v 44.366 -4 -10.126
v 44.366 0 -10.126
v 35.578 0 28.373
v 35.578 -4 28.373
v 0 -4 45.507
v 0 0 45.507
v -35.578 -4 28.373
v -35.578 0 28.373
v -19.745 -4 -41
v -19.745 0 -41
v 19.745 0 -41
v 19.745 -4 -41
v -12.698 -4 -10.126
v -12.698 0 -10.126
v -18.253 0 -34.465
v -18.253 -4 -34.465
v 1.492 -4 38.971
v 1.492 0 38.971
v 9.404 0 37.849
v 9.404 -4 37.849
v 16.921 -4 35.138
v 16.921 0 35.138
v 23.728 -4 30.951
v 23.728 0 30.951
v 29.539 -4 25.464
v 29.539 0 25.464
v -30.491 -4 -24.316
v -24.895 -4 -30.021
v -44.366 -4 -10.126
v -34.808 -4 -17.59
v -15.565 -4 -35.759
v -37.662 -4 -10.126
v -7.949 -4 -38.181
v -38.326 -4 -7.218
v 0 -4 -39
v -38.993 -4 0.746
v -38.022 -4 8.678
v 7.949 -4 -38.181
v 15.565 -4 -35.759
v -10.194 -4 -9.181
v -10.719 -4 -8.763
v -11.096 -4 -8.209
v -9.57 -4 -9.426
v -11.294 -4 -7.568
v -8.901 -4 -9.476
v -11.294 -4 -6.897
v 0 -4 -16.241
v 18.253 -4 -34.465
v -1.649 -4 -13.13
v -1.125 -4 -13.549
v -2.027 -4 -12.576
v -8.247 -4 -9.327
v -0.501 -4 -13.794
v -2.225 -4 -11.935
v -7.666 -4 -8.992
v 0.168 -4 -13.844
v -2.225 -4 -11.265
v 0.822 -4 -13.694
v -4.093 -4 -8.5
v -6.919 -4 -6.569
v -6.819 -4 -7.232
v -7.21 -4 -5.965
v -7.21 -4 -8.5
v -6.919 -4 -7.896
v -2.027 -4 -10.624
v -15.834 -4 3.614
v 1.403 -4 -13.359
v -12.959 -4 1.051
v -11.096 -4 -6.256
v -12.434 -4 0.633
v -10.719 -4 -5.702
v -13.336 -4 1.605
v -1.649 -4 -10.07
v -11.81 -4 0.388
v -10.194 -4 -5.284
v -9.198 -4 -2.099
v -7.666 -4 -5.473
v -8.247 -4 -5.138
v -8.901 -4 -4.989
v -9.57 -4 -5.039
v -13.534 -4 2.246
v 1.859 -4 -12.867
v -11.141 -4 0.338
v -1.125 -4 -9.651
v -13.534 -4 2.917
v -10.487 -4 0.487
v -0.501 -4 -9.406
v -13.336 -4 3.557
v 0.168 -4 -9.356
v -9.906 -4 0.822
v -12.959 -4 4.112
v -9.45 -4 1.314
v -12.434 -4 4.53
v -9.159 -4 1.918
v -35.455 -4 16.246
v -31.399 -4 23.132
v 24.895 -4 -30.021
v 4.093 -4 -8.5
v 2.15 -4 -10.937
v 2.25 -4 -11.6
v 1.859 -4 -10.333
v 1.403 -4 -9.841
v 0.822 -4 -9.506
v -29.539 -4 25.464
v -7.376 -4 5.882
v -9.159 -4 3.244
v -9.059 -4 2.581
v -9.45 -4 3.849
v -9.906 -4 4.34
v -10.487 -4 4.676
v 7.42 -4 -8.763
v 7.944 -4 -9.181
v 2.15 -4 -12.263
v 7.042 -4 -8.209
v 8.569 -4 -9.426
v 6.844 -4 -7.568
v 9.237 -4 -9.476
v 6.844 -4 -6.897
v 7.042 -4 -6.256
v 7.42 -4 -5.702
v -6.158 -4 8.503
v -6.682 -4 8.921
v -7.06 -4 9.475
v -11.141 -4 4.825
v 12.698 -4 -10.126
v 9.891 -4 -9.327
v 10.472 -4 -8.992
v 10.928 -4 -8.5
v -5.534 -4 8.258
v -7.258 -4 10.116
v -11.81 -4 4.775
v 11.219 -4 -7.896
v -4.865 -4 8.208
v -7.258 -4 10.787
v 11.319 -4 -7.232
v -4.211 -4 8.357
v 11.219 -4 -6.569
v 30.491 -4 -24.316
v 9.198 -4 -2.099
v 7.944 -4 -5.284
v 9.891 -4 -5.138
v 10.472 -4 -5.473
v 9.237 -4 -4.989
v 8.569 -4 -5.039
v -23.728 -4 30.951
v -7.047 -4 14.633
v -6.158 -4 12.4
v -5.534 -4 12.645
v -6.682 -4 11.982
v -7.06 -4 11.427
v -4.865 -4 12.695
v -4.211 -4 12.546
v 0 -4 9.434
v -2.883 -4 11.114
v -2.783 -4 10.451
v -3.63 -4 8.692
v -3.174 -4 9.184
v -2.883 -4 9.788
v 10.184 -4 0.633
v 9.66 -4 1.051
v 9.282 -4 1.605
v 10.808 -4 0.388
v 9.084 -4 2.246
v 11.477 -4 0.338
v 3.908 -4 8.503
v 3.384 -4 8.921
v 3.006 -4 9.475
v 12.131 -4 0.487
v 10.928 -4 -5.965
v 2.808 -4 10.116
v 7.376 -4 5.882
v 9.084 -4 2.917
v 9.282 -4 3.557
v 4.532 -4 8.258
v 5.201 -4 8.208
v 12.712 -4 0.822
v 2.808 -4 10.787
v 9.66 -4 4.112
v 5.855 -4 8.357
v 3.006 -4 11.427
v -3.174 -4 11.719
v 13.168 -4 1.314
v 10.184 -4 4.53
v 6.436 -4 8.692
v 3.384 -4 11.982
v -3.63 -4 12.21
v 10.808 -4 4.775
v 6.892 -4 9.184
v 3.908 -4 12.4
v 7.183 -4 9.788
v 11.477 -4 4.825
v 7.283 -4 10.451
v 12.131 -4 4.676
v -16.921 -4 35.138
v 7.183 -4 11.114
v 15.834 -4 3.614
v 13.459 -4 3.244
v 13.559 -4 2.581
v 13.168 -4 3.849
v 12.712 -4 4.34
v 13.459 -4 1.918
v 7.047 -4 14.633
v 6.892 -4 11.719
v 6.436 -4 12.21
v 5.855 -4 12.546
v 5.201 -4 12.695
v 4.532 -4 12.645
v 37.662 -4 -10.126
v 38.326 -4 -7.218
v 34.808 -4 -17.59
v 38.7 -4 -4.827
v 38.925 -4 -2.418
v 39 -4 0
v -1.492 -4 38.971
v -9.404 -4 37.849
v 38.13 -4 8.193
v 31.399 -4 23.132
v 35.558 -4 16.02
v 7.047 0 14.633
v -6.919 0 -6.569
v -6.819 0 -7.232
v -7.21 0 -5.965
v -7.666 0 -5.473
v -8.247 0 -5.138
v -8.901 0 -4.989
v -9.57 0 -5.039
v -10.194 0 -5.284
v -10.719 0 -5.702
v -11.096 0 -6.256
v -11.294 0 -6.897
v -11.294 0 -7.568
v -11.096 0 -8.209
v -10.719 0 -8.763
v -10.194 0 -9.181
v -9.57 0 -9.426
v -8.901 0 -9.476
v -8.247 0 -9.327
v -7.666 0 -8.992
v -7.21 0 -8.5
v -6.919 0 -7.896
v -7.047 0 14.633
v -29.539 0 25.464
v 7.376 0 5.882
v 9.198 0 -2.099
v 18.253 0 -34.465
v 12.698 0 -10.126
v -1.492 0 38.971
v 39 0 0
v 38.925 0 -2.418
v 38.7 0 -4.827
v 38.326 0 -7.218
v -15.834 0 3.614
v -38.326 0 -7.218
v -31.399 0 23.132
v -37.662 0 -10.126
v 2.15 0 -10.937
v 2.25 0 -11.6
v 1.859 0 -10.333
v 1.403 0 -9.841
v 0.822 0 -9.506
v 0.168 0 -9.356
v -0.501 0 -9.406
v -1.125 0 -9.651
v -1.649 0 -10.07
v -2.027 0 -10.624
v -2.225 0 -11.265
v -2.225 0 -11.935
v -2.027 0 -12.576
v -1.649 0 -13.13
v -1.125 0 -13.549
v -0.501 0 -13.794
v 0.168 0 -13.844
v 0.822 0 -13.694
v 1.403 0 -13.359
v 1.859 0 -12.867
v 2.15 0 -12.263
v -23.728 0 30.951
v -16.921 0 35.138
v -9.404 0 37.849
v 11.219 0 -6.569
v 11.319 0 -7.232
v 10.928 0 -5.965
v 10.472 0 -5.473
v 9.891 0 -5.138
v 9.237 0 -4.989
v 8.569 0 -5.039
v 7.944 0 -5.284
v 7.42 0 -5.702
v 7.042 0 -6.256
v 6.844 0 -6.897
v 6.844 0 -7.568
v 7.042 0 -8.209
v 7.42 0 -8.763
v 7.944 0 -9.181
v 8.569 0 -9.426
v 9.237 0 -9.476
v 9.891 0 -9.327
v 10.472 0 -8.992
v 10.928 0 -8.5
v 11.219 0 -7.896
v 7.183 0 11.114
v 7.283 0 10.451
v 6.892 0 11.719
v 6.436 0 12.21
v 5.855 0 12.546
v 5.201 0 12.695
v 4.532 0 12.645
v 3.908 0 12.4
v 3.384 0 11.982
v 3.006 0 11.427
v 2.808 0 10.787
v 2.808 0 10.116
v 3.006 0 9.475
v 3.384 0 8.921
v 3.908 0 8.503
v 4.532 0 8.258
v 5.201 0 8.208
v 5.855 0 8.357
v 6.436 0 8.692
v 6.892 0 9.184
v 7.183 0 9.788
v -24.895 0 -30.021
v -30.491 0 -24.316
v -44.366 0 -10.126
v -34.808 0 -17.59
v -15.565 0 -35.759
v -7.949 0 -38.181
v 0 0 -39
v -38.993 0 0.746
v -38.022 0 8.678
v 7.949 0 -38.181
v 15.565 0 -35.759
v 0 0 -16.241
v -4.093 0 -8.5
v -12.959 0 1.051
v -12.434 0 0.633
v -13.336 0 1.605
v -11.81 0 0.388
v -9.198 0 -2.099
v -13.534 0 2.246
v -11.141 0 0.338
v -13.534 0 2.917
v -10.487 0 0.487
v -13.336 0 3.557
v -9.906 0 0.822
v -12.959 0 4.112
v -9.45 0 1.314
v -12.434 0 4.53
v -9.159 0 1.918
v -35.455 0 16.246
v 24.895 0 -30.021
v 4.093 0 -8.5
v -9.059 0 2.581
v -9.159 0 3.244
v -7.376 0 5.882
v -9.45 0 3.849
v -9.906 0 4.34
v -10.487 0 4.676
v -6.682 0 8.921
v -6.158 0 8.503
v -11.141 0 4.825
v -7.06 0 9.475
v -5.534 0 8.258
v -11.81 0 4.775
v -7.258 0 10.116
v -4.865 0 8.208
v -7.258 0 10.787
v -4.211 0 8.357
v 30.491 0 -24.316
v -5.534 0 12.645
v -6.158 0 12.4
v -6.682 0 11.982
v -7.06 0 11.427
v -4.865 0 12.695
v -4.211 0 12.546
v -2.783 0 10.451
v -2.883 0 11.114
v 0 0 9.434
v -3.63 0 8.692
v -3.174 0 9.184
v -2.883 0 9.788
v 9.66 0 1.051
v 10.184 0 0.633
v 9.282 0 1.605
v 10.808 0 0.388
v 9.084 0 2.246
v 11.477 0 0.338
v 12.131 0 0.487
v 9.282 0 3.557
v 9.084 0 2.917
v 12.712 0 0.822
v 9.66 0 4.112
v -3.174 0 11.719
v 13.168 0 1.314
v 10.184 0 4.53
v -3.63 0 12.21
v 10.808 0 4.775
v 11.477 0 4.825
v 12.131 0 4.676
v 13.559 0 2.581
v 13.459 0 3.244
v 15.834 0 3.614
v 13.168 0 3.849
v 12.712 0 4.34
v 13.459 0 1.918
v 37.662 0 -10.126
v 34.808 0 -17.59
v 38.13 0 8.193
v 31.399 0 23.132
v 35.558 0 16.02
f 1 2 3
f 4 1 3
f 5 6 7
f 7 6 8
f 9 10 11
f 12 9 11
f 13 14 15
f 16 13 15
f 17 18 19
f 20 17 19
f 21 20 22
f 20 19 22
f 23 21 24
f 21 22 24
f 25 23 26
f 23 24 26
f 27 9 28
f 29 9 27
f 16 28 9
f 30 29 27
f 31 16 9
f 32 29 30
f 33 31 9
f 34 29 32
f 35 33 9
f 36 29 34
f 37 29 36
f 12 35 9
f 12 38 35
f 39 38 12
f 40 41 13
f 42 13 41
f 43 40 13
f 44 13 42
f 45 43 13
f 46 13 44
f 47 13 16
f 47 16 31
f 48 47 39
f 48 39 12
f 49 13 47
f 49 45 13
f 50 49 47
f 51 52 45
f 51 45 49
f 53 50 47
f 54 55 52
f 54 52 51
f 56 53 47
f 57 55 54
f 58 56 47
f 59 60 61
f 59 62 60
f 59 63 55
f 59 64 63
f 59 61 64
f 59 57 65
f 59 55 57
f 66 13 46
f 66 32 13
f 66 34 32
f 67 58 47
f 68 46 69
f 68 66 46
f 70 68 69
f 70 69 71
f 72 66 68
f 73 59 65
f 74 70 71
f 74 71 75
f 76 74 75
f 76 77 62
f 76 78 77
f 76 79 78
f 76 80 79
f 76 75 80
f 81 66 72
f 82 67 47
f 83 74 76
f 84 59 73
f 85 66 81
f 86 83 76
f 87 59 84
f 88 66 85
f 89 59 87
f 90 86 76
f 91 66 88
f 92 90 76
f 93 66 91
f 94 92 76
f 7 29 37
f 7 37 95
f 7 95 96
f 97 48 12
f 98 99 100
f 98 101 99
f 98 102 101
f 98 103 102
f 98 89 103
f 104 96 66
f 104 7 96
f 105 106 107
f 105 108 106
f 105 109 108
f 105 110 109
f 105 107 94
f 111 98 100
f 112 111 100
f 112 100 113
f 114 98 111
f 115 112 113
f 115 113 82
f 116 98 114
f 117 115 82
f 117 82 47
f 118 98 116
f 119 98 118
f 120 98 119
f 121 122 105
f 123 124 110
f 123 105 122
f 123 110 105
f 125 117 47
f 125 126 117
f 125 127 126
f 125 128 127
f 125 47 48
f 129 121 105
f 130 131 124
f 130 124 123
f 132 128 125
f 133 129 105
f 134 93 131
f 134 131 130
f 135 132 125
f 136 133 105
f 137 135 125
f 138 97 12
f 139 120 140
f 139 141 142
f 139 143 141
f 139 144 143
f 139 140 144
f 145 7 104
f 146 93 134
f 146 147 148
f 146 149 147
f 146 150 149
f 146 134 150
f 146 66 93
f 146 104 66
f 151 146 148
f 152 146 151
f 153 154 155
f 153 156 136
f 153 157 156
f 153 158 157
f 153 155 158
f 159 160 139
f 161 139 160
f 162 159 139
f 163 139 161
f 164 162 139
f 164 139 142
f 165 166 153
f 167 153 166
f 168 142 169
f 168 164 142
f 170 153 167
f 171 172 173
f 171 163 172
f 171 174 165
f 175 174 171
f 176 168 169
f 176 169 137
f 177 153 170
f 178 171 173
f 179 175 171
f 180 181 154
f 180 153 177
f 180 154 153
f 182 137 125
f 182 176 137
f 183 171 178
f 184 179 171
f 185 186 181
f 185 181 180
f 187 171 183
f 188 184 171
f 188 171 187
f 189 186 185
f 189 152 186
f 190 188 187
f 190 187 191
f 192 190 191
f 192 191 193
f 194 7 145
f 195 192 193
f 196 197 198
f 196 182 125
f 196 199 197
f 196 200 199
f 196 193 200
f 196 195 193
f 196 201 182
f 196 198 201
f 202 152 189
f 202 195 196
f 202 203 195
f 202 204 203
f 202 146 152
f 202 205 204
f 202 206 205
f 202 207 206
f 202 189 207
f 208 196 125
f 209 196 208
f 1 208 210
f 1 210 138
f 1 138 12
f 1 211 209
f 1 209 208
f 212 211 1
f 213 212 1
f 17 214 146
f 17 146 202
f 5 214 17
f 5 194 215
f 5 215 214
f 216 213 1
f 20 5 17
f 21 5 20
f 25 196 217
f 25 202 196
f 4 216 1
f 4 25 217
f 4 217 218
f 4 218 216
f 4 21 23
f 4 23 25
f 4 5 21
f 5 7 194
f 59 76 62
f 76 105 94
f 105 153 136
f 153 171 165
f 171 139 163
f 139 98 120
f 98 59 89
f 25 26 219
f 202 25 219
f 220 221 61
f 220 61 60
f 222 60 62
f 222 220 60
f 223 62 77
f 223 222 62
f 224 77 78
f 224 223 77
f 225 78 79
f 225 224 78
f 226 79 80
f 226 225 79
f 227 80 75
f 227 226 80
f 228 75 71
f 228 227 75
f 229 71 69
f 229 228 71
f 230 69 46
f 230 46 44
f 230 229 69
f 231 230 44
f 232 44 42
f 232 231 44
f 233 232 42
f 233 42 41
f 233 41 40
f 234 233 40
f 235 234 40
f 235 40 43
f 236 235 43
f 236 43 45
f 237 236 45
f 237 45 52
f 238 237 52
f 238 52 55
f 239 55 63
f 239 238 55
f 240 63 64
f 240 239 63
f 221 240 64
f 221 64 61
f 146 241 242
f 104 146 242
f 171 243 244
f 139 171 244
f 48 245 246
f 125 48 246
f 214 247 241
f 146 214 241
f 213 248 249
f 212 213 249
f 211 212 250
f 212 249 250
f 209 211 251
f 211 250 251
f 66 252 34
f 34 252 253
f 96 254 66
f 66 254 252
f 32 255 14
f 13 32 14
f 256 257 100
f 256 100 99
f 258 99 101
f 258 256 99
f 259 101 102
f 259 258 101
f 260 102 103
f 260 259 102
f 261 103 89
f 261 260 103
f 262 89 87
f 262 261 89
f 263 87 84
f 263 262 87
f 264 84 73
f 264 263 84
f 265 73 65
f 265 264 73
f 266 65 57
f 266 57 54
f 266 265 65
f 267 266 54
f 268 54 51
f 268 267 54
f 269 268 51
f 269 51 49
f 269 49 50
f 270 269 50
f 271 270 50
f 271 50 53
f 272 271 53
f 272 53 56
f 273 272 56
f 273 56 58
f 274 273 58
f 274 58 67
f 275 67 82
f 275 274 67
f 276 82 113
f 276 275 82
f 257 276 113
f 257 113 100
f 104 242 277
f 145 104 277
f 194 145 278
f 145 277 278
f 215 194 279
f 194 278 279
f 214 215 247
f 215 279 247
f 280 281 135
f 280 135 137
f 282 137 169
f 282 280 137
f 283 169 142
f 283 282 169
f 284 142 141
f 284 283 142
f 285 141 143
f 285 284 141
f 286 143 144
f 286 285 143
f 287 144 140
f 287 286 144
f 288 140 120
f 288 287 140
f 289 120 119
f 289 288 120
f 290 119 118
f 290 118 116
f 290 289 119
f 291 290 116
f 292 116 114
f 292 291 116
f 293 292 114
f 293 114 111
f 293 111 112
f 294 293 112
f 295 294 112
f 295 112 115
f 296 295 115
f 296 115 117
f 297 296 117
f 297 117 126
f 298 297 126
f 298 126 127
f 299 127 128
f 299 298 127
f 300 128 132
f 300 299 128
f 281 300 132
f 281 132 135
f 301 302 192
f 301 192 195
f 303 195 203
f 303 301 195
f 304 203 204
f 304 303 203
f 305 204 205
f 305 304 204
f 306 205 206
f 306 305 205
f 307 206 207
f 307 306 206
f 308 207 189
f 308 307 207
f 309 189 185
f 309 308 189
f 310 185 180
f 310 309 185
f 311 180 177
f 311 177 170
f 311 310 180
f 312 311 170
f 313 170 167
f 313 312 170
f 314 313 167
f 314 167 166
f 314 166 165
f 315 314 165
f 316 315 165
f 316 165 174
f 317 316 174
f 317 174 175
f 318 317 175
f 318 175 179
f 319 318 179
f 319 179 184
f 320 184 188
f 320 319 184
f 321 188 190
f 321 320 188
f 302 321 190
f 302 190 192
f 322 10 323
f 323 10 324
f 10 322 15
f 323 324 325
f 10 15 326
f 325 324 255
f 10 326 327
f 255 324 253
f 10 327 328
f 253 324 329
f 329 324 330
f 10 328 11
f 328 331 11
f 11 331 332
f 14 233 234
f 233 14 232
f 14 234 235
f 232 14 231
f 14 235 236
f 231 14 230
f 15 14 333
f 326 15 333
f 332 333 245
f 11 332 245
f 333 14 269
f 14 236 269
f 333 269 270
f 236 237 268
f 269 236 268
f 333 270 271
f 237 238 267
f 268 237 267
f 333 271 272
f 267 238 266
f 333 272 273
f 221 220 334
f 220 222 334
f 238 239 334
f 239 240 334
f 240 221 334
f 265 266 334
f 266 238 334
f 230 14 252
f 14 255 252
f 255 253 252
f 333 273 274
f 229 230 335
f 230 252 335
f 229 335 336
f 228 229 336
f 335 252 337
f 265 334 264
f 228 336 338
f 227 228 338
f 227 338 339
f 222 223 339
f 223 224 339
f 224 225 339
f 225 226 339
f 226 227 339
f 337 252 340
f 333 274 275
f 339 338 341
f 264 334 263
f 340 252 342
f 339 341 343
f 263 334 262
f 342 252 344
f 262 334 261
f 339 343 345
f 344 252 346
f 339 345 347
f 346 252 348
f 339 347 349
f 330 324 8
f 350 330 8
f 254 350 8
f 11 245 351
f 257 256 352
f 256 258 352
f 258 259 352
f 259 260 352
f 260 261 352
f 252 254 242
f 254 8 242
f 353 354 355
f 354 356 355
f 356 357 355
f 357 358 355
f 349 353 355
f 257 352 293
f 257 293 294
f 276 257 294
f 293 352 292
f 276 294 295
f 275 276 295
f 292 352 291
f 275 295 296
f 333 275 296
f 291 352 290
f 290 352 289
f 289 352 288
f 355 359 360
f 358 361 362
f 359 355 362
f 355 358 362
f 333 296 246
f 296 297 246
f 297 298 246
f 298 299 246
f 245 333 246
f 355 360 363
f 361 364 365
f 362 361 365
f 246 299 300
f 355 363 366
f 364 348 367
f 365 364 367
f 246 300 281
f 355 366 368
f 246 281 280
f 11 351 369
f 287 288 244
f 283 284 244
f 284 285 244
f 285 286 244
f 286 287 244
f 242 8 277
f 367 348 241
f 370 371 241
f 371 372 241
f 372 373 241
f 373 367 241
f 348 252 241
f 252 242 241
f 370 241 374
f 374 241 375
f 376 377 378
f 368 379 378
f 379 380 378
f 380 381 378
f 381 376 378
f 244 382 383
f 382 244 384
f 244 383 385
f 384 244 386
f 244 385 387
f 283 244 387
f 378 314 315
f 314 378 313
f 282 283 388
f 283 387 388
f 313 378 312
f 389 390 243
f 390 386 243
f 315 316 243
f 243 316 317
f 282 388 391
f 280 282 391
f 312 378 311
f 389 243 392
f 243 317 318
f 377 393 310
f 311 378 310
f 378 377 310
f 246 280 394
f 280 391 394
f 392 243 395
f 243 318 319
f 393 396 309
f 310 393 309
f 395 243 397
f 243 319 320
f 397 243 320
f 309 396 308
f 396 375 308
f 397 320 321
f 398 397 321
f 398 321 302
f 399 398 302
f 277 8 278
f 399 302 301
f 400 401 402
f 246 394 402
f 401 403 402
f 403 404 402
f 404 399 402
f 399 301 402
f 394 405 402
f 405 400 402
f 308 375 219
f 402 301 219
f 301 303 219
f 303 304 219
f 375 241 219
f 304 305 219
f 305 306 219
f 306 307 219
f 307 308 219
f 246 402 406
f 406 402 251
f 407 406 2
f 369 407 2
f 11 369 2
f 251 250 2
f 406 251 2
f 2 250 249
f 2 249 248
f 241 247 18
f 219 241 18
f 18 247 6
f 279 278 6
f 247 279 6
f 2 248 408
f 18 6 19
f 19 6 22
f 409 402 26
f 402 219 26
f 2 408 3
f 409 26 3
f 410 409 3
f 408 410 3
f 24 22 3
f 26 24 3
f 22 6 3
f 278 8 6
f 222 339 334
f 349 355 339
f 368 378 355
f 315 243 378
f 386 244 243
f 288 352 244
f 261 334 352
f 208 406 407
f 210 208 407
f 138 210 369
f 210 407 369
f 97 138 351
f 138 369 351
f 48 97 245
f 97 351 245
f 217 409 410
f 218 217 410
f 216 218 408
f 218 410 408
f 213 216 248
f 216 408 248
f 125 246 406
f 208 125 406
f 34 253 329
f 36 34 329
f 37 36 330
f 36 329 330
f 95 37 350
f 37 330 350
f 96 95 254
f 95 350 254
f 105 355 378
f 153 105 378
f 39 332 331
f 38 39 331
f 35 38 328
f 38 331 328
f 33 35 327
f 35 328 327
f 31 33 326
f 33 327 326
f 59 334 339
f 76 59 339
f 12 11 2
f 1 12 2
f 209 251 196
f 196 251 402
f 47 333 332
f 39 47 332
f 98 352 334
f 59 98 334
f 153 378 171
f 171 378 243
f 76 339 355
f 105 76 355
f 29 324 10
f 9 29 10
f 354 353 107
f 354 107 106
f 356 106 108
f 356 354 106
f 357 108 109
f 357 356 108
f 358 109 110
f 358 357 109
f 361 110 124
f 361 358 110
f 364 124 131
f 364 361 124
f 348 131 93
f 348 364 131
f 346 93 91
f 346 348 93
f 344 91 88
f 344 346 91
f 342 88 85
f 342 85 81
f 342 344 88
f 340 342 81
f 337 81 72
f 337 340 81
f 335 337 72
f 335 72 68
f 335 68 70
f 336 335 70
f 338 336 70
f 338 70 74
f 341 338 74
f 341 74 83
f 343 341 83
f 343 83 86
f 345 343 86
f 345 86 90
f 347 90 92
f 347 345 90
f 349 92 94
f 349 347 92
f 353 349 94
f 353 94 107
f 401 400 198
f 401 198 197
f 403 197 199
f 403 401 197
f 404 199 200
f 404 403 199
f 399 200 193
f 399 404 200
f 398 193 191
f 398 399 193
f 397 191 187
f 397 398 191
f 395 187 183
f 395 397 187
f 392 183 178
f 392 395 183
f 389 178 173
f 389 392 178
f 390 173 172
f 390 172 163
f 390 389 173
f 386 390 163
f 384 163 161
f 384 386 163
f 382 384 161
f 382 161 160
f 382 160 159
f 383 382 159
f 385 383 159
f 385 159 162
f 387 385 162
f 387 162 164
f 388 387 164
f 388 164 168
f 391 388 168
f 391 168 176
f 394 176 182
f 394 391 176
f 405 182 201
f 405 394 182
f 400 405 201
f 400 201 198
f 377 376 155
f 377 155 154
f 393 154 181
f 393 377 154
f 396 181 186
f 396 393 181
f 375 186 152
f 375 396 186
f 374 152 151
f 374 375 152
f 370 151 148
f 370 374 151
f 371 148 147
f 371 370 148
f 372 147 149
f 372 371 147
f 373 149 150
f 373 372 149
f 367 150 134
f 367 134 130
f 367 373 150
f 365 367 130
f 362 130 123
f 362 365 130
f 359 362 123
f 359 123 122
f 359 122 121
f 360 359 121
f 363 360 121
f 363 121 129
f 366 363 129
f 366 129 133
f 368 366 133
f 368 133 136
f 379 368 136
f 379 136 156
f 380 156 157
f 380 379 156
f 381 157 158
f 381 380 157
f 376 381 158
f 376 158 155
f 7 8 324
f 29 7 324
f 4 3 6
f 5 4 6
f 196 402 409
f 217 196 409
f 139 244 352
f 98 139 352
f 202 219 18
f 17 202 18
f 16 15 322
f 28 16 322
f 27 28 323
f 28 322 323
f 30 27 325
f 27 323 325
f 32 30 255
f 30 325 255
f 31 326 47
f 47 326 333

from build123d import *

# Parameters (mm, degrees)
F0_R     = 2.25
F1_DEPTH = 4


# Not quite as in the source:
# - a feature names something its author has since deleted; it is built from what else it names


with BuildPart() as f1:
    # F0 (on Front) → F1 (new body)
    with BuildSketch(Plane.XZ):
        with BuildLine():
            Line((-7.0467516529, 14.6327305836), (-29.539125133, 25.4644867683))
            ThreePointArc((-29.539125133, 25.4644867683), (-30.4914278163, 24.3161022725), (-31.3991126327, 23.1321362152))
            Line((-31.3991126327, 23.1321362152), (-15.8339072365, 3.6139860008))
            Line((-15.8339072365, 3.6139860008), (-8.7871555836, 7.0075227419))
            Line((-8.7871555836, 7.0075227419), (-7.0467516529, 14.6327305836))
        make_face()
        with BuildLine():
            Line((-1.4915941641, 38.9714658032), (-7.0467516529, 14.6327305836))
            Line((-7.0467516529, 14.6327305836), (0, 11.2391938425))
            Line((0, 11.2391938425), (7.0467516529, 14.6327305836))
            Line((7.0467516529, 14.6327305836), (1.4915941641, 38.9714658032))
            ThreePointArc((1.4915941641, 38.9714658032), (0, 39), (-1.4915941641, 38.9714658032))
        make_face()
        Polygon((0, 11.2391938425), (-7.0467516529, 14.6327305836), (-8.7871555836, 7.0075227419), (-15.8339072365, 3.6139860008), (-10.9574037875, -2.5009559107), (-12.6978077182, -10.1261637524), (-4.8765034491, -10.1261637524), (0, -16.241105664), (4.8765034491, -10.1261637524), (12.6978077182, -10.1261637524), (10.9574037875, -2.5009559107), (15.8339072365, 3.6139860008), (8.7871555836, 7.0075227419), (7.0467516529, 14.6327305836), align=None)
        with Locations((-9.0692451966, -7.2324817016)):
            Circle(F0_R, mode=Mode.SUBTRACT)
        with Locations((0, -11.6)):
            Circle(F0_R, mode=Mode.SUBTRACT)
        with Locations((9.0692451966, -7.2324817016)):
            Circle(F0_R, mode=Mode.SUBTRACT)
        with Locations((-11.3091637813, 2.5812428339)):
            Circle(F0_R, mode=Mode.SUBTRACT)
        with Locations((-5.0330513738, 10.4512388677)):
            Circle(F0_R, mode=Mode.SUBTRACT)
        Polygon((-9.1977509421, -2.0993266316), (-7.376023565, 5.8821825089), (0, 9.4342882455), (7.376023565, 5.8821825089), (9.1977509421, -2.0993266316), (4.0933842599, -8.5), (-4.0933842599, -8.5), align=None, mode=Mode.SUBTRACT)
        with Locations((11.3091637813, 2.5812428339)):
            Circle(F0_R, mode=Mode.SUBTRACT)
        with Locations((5.0330513738, 10.4512388677)):
            Circle(F0_R, mode=Mode.SUBTRACT)
        with BuildLine():
            Line((29.539125133, 25.4644867683), (7.0467516529, 14.6327305836))
            Line((7.0467516529, 14.6327305836), (8.7871555836, 7.0075227419))
            Line((8.7871555836, 7.0075227419), (15.8339072365, 3.6139860008))
            Line((15.8339072365, 3.6139860008), (31.3991126327, 23.1321362152))
            ThreePointArc((31.3991126327, 23.1321362152), (30.4914278163, 24.3161022725), (29.539125133, 25.4644867683))
        make_face()
        with BuildLine():
            Line((38.3262807167, -7.2177701839), (15.8339072365, 3.6139860008))
            Line((15.8339072365, 3.6139860008), (10.9574037875, -2.5009559107))
            Line((10.9574037875, -2.5009559107), (12.6978077182, -10.1261637524))
            Line((12.6978077182, -10.1261637524), (37.6624588637, -10.1261637524))
            ThreePointArc((37.6624588637, -10.1261637524), (38.0221885751, -8.6783164243), (38.3262807167, -7.2177701839))
        make_face()
        with BuildLine():
            Line((4.8765034491, -10.1261637524), (0, -16.241105664))
            Line((0, -16.241105664), (15.5652053962, -35.7592558784))
            ThreePointArc((15.5652053962, -35.7592558784), (16.9214658256, -35.1377858482), (18.252965207, -34.464898972))
            Line((18.252965207, -34.464898972), (12.6978077182, -10.1261637524))
            Line((12.6978077182, -10.1261637524), (4.8765034491, -10.1261637524))
        make_face()
        with BuildLine():
            Line((-4.8765034491, -10.1261637524), (-12.6978077182, -10.1261637524))
            Line((-12.6978077182, -10.1261637524), (-18.252965207, -34.464898972))
            ThreePointArc((-18.252965207, -34.464898972), (-16.9214658256, -35.1377858482), (-15.5652053962, -35.7592558784))
            Line((-15.5652053962, -35.7592558784), (0, -16.241105664))
            Line((0, -16.241105664), (-4.8765034491, -10.1261637524))
        make_face()
        with BuildLine():
            Line((-10.9574037875, -2.5009559107), (-15.8339072365, 3.6139860008))
            Line((-15.8339072365, 3.6139860008), (-38.3262807167, -7.2177701839))
            ThreePointArc((-38.3262807167, -7.2177701839), (-38.0221885751, -8.6783164243), (-37.6624588637, -10.1261637524))
            Line((-37.6624588637, -10.1261637524), (-12.6978077182, -10.1261637524))
            Line((-12.6978077182, -10.1261637524), (-10.9574037875, -2.5009559107))
        make_face()
        with BuildLine():
            Line((-29.539125133, 25.4644867683), (-35.5784666076, 28.3728803368))
            Line((-35.5784666076, 28.3728803368), (-31.3991126327, 23.1321362152))
            ThreePointArc((-31.3991126327, 23.1321362152), (-30.4914278163, 24.3161022725), (-29.539125133, 25.4644867683))
        make_face()
        with BuildLine():
            Line((1.4915941641, 38.9714658032), (0, 45.5065668312))
            Line((0, 45.5065668312), (-1.4915941641, 38.9714658032))
            ThreePointArc((-1.4915941641, 38.9714658032), (0, 39), (1.4915941641, 38.9714658032))
        make_face()
        with BuildLine():
            Line((-38.3262807167, -7.2177701839), (-44.3656221913, -10.1261637524))
            Line((-44.3656221913, -10.1261637524), (-37.6624588637, -10.1261637524))
            ThreePointArc((-37.6624588637, -10.1261637524), (-38.0221885751, -8.6783164243), (-38.3262807167, -7.2177701839))
        make_face()
        with BuildLine():
            Line((31.3991126327, 23.1321362152), (35.5784666076, 28.3728803368))
            Line((35.5784666076, 28.3728803368), (29.539125133, 25.4644867683))
            ThreePointArc((29.539125133, 25.4644867683), (30.4914278163, 24.3161022725), (31.3991126327, 23.1321362152))
        make_face()
        with BuildLine():
            Line((37.6624588637, -10.1261637524), (44.3656221913, -10.1261637524))
            Line((44.3656221913, -10.1261637524), (38.3262807167, -7.2177701839))
            ThreePointArc((38.3262807167, -7.2177701839), (38.0221885751, -8.6783164243), (37.6624588637, -10.1261637524))
        make_face()
        with BuildLine():
            Line((15.5652053962, -35.7592558784), (19.7445593711, -41))
            Line((19.7445593711, -41), (18.252965207, -34.464898972))
            ThreePointArc((18.252965207, -34.464898972), (16.9214658256, -35.1377858482), (15.5652053962, -35.7592558784))
        make_face()
        with BuildLine():
            Line((-18.252965207, -34.464898972), (-19.7445593711, -41))
            Line((-19.7445593711, -41), (-15.5652053962, -35.7592558784))
            ThreePointArc((-15.5652053962, -35.7592558784), (-16.9214658256, -35.1377858482), (-18.252965207, -34.464898972))
        make_face()
        with BuildLine():
            Line((0, 45.5065668312), (-35.5784666076, 28.3728803368))
            Line((-35.5784666076, 28.3728803368), (-29.539125133, 25.4644867683))
            ThreePointArc((-29.539125133, 25.4644867683), (-16.9214658256, 35.1377858482), (-1.4915941641, 38.9714658032))
            Line((-1.4915941641, 38.9714658032), (0, 45.5065668312))
        make_face()
        with BuildLine():
            Line((-31.3991126327, 23.1321362152), (-35.5784666076, 28.3728803368))
            Line((-35.5784666076, 28.3728803368), (-44.3656221913, -10.1261637524))
            Line((-44.3656221913, -10.1261637524), (-38.3262807167, -7.2177701839))
            ThreePointArc((-38.3262807167, -7.2177701839), (-38.0221885751, 8.6783164243), (-31.3991126327, 23.1321362152))
        make_face()
        with BuildLine():
            Line((35.5784666076, 28.3728803368), (0, 45.5065668312))
            Line((0, 45.5065668312), (1.4915941641, 38.9714658032))
            ThreePointArc((1.4915941641, 38.9714658032), (16.9214658256, 35.1377858482), (29.539125133, 25.4644867683))
            Line((29.539125133, 25.4644867683), (35.5784666076, 28.3728803368))
        make_face()
        with BuildLine():
            Line((44.3656221913, -10.1261637524), (35.5784666076, 28.3728803368))
            Line((35.5784666076, 28.3728803368), (31.3991126327, 23.1321362152))
            ThreePointArc((31.3991126327, 23.1321362152), (37.051082256, 12.1744529102), (39, 0))
            ThreePointArc((39, 0), (38.8312048999, -3.62457253), (38.3262807167, -7.2177701839))
            Line((38.3262807167, -7.2177701839), (44.3656221913, -10.1261637524))
        make_face()
        with BuildLine():
            Line((19.7445593711, -41), (44.3656221913, -10.1261637524))
            Line((44.3656221913, -10.1261637524), (37.6624588637, -10.1261637524))
            ThreePointArc((37.6624588637, -10.1261637524), (30.4914278163, -24.3161022725), (18.252965207, -34.464898972))
            Line((18.252965207, -34.464898972), (19.7445593711, -41))
        make_face()
        with BuildLine():
            Line((-15.5652053962, -35.7592558784), (-19.7445593711, -41))
            Line((-19.7445593711, -41), (19.7445593711, -41))
            Line((19.7445593711, -41), (15.5652053962, -35.7592558784))
            ThreePointArc((15.5652053962, -35.7592558784), (0, -39), (-15.5652053962, -35.7592558784))
        make_face()
        with BuildLine():
            Line((-37.6624588637, -10.1261637524), (-44.3656221913, -10.1261637524))
            Line((-44.3656221913, -10.1261637524), (-19.7445593711, -41))
            Line((-19.7445593711, -41), (-18.252965207, -34.464898972))
            ThreePointArc((-18.252965207, -34.464898972), (-30.4914278163, -24.3161022725), (-37.6624588637, -10.1261637524))
        make_face()
    extrude(amount=F1_DEPTH)


solid = f1.part
